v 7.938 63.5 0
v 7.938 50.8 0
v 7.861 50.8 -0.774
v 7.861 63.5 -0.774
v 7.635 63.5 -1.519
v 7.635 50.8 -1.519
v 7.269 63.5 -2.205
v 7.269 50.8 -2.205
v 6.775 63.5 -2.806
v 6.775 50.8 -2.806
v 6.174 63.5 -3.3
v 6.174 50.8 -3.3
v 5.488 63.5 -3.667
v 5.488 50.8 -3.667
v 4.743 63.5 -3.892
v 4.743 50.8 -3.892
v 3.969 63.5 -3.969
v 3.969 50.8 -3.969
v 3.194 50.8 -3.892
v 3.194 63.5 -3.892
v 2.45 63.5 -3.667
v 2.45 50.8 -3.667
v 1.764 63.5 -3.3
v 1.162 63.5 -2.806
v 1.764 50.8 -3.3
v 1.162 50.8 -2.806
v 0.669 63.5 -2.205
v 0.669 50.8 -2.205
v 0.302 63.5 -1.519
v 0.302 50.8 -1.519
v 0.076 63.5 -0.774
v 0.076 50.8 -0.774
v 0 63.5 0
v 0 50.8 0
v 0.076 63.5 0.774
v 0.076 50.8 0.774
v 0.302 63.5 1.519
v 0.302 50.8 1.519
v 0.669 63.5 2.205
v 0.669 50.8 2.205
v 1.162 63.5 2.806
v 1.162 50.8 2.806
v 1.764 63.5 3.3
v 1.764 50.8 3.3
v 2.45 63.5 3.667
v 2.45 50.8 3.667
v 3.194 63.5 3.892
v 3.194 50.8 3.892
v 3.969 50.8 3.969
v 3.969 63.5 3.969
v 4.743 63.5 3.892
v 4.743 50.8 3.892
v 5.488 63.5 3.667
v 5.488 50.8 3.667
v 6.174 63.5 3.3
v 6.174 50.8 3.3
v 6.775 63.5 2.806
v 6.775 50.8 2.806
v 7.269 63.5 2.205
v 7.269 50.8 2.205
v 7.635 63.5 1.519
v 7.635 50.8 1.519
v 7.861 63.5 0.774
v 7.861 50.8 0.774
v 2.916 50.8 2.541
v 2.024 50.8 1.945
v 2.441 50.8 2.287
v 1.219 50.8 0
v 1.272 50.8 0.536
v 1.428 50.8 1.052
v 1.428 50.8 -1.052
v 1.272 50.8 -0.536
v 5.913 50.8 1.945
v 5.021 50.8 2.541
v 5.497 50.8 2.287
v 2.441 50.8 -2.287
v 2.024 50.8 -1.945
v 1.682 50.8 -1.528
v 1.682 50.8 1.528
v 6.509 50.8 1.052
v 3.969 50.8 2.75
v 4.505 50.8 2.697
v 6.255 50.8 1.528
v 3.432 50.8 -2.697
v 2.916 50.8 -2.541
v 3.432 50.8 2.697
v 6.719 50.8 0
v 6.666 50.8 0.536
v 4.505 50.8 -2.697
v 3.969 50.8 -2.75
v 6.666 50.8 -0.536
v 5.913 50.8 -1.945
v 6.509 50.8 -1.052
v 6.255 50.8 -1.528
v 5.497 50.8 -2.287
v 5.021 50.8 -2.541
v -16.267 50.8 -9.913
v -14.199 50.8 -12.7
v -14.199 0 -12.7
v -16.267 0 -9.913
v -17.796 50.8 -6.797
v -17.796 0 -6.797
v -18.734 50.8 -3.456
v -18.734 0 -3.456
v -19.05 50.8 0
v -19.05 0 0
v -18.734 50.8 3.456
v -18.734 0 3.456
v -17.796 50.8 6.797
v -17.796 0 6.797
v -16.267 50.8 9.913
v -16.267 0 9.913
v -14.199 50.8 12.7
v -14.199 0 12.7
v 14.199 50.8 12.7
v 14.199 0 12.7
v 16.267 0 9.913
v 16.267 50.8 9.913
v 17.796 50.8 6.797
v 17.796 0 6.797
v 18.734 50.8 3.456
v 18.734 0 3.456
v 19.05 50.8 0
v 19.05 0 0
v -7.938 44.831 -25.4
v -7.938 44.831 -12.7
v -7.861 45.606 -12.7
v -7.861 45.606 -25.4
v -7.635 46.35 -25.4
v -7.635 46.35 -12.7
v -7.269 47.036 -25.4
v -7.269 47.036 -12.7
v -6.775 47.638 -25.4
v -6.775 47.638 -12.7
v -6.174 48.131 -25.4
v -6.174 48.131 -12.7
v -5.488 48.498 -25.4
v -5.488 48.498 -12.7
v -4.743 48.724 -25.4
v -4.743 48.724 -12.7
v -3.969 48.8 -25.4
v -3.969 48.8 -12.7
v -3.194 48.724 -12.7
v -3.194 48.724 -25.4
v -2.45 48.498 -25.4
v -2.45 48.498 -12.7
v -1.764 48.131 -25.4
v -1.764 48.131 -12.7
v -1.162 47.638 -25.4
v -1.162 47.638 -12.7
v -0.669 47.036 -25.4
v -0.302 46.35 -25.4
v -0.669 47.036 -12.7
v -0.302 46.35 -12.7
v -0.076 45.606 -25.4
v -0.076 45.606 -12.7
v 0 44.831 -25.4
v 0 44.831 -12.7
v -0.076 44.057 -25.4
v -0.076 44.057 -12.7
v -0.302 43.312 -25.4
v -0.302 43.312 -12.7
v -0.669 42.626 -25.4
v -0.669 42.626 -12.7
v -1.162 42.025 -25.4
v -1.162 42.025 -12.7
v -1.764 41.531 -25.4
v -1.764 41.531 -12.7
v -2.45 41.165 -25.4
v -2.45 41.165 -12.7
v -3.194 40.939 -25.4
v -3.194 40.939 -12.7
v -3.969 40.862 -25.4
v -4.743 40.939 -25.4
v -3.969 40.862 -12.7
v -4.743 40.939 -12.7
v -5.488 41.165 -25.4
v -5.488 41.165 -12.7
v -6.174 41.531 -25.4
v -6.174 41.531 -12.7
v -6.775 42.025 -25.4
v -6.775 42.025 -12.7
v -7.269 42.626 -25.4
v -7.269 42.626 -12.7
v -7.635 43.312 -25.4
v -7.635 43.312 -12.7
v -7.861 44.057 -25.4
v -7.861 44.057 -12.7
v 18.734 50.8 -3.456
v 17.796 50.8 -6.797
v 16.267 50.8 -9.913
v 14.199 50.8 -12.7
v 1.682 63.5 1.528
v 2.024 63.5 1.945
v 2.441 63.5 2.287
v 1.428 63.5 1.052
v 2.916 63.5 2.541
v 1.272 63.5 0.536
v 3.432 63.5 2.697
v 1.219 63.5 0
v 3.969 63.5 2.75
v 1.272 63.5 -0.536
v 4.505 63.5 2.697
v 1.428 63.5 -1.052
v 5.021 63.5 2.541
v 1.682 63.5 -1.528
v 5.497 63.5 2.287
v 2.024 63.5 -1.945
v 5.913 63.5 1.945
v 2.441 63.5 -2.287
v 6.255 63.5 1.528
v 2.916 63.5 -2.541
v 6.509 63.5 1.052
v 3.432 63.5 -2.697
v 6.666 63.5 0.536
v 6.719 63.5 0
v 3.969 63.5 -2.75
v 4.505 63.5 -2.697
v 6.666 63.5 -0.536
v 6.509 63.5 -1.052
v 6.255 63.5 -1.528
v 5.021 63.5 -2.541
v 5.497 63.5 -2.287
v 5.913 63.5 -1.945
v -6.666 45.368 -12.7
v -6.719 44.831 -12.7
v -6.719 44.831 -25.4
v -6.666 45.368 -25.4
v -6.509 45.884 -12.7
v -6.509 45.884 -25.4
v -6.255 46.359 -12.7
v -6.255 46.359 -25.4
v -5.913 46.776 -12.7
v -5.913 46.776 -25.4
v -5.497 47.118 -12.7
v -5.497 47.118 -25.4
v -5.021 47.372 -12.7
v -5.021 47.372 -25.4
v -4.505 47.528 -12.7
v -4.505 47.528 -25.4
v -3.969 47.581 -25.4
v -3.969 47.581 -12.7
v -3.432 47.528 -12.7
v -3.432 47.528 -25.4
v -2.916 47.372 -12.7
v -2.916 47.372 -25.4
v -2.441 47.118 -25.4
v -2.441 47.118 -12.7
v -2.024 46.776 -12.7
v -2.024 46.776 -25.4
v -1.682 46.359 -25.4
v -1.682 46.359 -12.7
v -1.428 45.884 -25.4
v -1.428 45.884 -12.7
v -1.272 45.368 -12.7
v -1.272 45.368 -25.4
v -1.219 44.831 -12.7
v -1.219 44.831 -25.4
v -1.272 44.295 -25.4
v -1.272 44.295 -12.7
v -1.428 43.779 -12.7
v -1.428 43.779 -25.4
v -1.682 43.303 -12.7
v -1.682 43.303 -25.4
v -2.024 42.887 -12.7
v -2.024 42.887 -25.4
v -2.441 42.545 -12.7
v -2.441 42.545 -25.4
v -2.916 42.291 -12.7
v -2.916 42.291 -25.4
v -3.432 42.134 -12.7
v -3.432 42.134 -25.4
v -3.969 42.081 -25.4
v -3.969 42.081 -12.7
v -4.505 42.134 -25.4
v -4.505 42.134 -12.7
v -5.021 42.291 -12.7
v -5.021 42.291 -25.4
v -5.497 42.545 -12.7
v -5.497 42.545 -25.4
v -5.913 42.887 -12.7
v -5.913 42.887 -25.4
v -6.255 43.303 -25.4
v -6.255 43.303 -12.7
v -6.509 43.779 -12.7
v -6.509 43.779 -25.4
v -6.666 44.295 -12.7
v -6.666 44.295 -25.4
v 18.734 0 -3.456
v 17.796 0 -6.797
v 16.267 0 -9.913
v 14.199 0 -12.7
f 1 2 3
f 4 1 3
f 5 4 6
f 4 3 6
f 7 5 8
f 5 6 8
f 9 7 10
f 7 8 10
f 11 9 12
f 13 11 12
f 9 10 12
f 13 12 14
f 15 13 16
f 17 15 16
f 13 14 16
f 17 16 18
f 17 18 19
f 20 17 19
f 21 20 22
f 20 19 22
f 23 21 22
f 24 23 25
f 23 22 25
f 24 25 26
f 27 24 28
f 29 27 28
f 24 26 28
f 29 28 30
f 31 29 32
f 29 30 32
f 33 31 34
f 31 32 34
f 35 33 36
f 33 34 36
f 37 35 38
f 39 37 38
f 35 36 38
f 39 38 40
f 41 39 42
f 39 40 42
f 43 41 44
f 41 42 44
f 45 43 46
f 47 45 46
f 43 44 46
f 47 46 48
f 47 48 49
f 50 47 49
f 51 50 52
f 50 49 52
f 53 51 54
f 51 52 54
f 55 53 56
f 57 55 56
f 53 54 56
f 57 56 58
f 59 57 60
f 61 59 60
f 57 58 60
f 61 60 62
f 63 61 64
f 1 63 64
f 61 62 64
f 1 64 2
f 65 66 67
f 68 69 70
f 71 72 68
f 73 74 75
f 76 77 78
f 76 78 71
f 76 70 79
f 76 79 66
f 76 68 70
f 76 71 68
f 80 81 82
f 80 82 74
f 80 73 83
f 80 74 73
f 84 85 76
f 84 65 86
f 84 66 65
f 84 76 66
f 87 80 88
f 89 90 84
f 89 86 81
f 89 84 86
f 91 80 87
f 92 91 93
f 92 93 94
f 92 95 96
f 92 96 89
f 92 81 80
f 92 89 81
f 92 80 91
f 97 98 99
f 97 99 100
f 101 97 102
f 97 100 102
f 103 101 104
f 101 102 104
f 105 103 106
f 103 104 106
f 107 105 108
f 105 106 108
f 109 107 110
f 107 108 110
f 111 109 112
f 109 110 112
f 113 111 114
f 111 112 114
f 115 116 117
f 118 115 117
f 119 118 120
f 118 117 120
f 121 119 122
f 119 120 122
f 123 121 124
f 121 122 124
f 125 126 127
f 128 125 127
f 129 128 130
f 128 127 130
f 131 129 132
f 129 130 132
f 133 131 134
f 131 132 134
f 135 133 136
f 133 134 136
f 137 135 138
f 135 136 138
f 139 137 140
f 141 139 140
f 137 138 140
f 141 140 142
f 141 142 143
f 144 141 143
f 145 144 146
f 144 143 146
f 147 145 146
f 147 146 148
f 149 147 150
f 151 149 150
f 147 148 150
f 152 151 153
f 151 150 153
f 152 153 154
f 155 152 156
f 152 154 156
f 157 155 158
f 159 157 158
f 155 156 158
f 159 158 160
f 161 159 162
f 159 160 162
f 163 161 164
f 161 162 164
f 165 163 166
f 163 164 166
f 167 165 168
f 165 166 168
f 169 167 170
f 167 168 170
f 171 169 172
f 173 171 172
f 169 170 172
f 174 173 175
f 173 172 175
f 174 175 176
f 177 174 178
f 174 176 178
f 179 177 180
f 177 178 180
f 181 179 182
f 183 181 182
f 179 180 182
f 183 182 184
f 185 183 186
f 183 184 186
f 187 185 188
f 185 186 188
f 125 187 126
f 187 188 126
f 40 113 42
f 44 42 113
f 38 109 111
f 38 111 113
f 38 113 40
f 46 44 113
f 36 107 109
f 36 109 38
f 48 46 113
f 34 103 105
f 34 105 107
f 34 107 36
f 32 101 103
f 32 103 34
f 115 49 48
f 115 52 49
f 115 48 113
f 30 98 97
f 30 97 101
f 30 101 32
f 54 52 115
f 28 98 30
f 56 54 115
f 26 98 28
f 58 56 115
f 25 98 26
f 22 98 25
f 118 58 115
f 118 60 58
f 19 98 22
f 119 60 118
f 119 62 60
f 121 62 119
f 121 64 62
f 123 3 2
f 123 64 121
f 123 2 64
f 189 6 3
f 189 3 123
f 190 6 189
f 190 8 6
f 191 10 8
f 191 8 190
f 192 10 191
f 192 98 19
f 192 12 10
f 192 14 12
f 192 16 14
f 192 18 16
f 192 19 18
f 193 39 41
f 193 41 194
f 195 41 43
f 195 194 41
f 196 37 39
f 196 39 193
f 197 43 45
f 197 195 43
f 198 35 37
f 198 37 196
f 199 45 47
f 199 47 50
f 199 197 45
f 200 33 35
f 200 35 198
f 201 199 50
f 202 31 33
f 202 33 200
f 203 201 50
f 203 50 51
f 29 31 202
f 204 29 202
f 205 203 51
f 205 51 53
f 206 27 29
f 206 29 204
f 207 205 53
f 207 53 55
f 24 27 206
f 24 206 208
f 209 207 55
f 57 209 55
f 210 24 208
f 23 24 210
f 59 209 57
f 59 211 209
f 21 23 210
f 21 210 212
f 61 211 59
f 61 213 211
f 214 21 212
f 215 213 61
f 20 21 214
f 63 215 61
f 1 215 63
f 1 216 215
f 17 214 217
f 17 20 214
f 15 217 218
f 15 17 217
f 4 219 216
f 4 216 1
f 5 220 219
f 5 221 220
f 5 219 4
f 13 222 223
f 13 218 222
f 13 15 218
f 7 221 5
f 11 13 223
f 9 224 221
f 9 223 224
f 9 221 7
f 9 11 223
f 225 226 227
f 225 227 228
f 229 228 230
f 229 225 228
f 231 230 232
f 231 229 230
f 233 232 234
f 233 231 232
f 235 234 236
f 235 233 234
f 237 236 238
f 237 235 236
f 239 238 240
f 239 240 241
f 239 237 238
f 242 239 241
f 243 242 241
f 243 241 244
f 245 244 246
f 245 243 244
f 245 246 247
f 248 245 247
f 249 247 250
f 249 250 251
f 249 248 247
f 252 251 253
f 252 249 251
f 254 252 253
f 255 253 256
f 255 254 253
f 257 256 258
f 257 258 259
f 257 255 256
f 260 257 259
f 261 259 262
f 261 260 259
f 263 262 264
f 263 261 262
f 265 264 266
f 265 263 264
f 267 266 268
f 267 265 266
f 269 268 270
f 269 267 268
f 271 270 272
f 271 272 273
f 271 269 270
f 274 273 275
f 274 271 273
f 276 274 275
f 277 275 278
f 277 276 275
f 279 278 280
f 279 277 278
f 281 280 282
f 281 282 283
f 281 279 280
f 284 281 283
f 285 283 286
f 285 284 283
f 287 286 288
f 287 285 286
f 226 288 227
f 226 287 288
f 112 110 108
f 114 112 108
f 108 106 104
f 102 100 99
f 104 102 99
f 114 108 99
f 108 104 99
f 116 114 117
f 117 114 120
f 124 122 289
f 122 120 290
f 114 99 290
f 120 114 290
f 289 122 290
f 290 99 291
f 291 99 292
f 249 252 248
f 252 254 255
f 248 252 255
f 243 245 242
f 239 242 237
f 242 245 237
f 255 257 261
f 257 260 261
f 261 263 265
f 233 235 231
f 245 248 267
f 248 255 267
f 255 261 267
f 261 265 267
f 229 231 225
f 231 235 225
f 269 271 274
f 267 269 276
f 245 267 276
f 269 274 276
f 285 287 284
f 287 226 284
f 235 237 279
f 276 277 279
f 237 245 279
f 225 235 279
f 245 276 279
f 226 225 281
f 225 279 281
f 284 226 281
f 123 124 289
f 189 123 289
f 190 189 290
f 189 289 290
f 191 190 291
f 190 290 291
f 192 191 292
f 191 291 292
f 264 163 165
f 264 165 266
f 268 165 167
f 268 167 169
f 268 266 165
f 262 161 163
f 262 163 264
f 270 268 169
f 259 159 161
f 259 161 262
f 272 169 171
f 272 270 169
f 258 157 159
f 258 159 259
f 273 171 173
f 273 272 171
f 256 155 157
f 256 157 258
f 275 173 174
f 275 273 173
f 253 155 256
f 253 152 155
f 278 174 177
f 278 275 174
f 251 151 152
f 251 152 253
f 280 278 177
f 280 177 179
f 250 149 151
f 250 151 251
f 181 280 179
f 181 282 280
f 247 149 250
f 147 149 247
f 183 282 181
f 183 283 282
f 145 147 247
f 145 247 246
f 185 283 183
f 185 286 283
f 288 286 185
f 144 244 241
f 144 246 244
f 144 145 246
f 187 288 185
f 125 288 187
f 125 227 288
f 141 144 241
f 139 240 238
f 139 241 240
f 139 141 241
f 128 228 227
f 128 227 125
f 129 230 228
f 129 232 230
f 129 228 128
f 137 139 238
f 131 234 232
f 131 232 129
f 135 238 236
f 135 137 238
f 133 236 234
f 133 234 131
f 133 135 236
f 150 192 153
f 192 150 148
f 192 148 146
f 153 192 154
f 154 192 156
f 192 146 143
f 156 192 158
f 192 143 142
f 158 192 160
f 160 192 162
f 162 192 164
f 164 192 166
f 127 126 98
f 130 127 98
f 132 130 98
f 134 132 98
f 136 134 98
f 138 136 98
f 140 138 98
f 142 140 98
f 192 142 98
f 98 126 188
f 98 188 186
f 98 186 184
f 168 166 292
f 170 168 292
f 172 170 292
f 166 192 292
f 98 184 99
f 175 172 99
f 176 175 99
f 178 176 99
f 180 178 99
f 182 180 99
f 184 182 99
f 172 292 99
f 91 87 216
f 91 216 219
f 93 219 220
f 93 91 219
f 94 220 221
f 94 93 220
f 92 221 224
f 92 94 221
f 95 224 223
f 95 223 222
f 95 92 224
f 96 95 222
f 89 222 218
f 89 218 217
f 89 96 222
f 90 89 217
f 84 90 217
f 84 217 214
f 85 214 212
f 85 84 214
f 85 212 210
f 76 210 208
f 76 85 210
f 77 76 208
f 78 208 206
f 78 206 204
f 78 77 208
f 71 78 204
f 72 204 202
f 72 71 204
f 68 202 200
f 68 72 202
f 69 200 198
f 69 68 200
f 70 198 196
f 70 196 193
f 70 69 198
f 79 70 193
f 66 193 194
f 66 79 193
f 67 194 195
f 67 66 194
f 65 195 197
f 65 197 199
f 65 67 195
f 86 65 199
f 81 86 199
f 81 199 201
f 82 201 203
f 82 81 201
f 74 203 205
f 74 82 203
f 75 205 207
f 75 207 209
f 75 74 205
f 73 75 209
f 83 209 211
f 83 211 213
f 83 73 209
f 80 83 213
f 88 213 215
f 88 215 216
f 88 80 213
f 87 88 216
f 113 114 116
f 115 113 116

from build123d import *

# Parameters (mm, degrees)
BOSS_EXTRUDE2_DEPTH = 50.8
SKETCH2_R           = 3.96875
SKETCH2_R_2         = 2.75
BOSS_EXTRUDE3_DEPTH = 12.7
SKETCH3_R           = 3.96875
SKETCH3_R_2         = 2.75
BOSS_EXTRUDE4_DEPTH = 12.7


with BuildPart() as part:
    # Sketch1 → Boss-Extrude2 (new body)
    with BuildSketch(Plane(origin=(0, 0, 0), x_dir=(1, 0, 0), z_dir=(0, 1, 0))):
        with BuildLine():
            Line((14.199031657, 12.7), (-14.199031657, 12.7))
            ThreePointArc((-14.199031657, 12.7), (-19.05, 0), (-14.199031657, -12.7))
            Line((-14.199031657, -12.7), (14.199031657, -12.7))
            ThreePointArc((14.199031657, -12.7), (17.795983438, -6.79746081), (19.05, 0))
            ThreePointArc((19.05, 0), (17.795983438, 6.79746081), (14.199031657, 12.7))
        make_face()
    extrude(amount=BOSS_EXTRUDE2_DEPTH)

    # Sketch2 → Boss-Extrude3 (add)
    with BuildSketch(Plane(origin=(0, 50.8, 0), x_dir=(1, 0, 0), z_dir=(0, 1, 0))):
        with Locations((3.96875, 0)):
            Circle(SKETCH2_R)
        with Locations((3.96875, 0)):
            Circle(SKETCH2_R_2, mode=Mode.SUBTRACT)
    extrude(amount=BOSS_EXTRUDE3_DEPTH)

    # Sketch3 → Boss-Extrude4 (add)
    with BuildSketch(Plane(origin=(0, 0, -12.7), x_dir=(-1, 0, 0), z_dir=(0, 0, -1))):
        with Locations((3.96875, 44.83125)):
            Circle(SKETCH3_R)
        with Locations((3.96875, 44.83125)):
            Circle(SKETCH3_R_2, mode=Mode.SUBTRACT)
    extrude(amount=BOSS_EXTRUDE4_DEPTH)


solid = part.part
